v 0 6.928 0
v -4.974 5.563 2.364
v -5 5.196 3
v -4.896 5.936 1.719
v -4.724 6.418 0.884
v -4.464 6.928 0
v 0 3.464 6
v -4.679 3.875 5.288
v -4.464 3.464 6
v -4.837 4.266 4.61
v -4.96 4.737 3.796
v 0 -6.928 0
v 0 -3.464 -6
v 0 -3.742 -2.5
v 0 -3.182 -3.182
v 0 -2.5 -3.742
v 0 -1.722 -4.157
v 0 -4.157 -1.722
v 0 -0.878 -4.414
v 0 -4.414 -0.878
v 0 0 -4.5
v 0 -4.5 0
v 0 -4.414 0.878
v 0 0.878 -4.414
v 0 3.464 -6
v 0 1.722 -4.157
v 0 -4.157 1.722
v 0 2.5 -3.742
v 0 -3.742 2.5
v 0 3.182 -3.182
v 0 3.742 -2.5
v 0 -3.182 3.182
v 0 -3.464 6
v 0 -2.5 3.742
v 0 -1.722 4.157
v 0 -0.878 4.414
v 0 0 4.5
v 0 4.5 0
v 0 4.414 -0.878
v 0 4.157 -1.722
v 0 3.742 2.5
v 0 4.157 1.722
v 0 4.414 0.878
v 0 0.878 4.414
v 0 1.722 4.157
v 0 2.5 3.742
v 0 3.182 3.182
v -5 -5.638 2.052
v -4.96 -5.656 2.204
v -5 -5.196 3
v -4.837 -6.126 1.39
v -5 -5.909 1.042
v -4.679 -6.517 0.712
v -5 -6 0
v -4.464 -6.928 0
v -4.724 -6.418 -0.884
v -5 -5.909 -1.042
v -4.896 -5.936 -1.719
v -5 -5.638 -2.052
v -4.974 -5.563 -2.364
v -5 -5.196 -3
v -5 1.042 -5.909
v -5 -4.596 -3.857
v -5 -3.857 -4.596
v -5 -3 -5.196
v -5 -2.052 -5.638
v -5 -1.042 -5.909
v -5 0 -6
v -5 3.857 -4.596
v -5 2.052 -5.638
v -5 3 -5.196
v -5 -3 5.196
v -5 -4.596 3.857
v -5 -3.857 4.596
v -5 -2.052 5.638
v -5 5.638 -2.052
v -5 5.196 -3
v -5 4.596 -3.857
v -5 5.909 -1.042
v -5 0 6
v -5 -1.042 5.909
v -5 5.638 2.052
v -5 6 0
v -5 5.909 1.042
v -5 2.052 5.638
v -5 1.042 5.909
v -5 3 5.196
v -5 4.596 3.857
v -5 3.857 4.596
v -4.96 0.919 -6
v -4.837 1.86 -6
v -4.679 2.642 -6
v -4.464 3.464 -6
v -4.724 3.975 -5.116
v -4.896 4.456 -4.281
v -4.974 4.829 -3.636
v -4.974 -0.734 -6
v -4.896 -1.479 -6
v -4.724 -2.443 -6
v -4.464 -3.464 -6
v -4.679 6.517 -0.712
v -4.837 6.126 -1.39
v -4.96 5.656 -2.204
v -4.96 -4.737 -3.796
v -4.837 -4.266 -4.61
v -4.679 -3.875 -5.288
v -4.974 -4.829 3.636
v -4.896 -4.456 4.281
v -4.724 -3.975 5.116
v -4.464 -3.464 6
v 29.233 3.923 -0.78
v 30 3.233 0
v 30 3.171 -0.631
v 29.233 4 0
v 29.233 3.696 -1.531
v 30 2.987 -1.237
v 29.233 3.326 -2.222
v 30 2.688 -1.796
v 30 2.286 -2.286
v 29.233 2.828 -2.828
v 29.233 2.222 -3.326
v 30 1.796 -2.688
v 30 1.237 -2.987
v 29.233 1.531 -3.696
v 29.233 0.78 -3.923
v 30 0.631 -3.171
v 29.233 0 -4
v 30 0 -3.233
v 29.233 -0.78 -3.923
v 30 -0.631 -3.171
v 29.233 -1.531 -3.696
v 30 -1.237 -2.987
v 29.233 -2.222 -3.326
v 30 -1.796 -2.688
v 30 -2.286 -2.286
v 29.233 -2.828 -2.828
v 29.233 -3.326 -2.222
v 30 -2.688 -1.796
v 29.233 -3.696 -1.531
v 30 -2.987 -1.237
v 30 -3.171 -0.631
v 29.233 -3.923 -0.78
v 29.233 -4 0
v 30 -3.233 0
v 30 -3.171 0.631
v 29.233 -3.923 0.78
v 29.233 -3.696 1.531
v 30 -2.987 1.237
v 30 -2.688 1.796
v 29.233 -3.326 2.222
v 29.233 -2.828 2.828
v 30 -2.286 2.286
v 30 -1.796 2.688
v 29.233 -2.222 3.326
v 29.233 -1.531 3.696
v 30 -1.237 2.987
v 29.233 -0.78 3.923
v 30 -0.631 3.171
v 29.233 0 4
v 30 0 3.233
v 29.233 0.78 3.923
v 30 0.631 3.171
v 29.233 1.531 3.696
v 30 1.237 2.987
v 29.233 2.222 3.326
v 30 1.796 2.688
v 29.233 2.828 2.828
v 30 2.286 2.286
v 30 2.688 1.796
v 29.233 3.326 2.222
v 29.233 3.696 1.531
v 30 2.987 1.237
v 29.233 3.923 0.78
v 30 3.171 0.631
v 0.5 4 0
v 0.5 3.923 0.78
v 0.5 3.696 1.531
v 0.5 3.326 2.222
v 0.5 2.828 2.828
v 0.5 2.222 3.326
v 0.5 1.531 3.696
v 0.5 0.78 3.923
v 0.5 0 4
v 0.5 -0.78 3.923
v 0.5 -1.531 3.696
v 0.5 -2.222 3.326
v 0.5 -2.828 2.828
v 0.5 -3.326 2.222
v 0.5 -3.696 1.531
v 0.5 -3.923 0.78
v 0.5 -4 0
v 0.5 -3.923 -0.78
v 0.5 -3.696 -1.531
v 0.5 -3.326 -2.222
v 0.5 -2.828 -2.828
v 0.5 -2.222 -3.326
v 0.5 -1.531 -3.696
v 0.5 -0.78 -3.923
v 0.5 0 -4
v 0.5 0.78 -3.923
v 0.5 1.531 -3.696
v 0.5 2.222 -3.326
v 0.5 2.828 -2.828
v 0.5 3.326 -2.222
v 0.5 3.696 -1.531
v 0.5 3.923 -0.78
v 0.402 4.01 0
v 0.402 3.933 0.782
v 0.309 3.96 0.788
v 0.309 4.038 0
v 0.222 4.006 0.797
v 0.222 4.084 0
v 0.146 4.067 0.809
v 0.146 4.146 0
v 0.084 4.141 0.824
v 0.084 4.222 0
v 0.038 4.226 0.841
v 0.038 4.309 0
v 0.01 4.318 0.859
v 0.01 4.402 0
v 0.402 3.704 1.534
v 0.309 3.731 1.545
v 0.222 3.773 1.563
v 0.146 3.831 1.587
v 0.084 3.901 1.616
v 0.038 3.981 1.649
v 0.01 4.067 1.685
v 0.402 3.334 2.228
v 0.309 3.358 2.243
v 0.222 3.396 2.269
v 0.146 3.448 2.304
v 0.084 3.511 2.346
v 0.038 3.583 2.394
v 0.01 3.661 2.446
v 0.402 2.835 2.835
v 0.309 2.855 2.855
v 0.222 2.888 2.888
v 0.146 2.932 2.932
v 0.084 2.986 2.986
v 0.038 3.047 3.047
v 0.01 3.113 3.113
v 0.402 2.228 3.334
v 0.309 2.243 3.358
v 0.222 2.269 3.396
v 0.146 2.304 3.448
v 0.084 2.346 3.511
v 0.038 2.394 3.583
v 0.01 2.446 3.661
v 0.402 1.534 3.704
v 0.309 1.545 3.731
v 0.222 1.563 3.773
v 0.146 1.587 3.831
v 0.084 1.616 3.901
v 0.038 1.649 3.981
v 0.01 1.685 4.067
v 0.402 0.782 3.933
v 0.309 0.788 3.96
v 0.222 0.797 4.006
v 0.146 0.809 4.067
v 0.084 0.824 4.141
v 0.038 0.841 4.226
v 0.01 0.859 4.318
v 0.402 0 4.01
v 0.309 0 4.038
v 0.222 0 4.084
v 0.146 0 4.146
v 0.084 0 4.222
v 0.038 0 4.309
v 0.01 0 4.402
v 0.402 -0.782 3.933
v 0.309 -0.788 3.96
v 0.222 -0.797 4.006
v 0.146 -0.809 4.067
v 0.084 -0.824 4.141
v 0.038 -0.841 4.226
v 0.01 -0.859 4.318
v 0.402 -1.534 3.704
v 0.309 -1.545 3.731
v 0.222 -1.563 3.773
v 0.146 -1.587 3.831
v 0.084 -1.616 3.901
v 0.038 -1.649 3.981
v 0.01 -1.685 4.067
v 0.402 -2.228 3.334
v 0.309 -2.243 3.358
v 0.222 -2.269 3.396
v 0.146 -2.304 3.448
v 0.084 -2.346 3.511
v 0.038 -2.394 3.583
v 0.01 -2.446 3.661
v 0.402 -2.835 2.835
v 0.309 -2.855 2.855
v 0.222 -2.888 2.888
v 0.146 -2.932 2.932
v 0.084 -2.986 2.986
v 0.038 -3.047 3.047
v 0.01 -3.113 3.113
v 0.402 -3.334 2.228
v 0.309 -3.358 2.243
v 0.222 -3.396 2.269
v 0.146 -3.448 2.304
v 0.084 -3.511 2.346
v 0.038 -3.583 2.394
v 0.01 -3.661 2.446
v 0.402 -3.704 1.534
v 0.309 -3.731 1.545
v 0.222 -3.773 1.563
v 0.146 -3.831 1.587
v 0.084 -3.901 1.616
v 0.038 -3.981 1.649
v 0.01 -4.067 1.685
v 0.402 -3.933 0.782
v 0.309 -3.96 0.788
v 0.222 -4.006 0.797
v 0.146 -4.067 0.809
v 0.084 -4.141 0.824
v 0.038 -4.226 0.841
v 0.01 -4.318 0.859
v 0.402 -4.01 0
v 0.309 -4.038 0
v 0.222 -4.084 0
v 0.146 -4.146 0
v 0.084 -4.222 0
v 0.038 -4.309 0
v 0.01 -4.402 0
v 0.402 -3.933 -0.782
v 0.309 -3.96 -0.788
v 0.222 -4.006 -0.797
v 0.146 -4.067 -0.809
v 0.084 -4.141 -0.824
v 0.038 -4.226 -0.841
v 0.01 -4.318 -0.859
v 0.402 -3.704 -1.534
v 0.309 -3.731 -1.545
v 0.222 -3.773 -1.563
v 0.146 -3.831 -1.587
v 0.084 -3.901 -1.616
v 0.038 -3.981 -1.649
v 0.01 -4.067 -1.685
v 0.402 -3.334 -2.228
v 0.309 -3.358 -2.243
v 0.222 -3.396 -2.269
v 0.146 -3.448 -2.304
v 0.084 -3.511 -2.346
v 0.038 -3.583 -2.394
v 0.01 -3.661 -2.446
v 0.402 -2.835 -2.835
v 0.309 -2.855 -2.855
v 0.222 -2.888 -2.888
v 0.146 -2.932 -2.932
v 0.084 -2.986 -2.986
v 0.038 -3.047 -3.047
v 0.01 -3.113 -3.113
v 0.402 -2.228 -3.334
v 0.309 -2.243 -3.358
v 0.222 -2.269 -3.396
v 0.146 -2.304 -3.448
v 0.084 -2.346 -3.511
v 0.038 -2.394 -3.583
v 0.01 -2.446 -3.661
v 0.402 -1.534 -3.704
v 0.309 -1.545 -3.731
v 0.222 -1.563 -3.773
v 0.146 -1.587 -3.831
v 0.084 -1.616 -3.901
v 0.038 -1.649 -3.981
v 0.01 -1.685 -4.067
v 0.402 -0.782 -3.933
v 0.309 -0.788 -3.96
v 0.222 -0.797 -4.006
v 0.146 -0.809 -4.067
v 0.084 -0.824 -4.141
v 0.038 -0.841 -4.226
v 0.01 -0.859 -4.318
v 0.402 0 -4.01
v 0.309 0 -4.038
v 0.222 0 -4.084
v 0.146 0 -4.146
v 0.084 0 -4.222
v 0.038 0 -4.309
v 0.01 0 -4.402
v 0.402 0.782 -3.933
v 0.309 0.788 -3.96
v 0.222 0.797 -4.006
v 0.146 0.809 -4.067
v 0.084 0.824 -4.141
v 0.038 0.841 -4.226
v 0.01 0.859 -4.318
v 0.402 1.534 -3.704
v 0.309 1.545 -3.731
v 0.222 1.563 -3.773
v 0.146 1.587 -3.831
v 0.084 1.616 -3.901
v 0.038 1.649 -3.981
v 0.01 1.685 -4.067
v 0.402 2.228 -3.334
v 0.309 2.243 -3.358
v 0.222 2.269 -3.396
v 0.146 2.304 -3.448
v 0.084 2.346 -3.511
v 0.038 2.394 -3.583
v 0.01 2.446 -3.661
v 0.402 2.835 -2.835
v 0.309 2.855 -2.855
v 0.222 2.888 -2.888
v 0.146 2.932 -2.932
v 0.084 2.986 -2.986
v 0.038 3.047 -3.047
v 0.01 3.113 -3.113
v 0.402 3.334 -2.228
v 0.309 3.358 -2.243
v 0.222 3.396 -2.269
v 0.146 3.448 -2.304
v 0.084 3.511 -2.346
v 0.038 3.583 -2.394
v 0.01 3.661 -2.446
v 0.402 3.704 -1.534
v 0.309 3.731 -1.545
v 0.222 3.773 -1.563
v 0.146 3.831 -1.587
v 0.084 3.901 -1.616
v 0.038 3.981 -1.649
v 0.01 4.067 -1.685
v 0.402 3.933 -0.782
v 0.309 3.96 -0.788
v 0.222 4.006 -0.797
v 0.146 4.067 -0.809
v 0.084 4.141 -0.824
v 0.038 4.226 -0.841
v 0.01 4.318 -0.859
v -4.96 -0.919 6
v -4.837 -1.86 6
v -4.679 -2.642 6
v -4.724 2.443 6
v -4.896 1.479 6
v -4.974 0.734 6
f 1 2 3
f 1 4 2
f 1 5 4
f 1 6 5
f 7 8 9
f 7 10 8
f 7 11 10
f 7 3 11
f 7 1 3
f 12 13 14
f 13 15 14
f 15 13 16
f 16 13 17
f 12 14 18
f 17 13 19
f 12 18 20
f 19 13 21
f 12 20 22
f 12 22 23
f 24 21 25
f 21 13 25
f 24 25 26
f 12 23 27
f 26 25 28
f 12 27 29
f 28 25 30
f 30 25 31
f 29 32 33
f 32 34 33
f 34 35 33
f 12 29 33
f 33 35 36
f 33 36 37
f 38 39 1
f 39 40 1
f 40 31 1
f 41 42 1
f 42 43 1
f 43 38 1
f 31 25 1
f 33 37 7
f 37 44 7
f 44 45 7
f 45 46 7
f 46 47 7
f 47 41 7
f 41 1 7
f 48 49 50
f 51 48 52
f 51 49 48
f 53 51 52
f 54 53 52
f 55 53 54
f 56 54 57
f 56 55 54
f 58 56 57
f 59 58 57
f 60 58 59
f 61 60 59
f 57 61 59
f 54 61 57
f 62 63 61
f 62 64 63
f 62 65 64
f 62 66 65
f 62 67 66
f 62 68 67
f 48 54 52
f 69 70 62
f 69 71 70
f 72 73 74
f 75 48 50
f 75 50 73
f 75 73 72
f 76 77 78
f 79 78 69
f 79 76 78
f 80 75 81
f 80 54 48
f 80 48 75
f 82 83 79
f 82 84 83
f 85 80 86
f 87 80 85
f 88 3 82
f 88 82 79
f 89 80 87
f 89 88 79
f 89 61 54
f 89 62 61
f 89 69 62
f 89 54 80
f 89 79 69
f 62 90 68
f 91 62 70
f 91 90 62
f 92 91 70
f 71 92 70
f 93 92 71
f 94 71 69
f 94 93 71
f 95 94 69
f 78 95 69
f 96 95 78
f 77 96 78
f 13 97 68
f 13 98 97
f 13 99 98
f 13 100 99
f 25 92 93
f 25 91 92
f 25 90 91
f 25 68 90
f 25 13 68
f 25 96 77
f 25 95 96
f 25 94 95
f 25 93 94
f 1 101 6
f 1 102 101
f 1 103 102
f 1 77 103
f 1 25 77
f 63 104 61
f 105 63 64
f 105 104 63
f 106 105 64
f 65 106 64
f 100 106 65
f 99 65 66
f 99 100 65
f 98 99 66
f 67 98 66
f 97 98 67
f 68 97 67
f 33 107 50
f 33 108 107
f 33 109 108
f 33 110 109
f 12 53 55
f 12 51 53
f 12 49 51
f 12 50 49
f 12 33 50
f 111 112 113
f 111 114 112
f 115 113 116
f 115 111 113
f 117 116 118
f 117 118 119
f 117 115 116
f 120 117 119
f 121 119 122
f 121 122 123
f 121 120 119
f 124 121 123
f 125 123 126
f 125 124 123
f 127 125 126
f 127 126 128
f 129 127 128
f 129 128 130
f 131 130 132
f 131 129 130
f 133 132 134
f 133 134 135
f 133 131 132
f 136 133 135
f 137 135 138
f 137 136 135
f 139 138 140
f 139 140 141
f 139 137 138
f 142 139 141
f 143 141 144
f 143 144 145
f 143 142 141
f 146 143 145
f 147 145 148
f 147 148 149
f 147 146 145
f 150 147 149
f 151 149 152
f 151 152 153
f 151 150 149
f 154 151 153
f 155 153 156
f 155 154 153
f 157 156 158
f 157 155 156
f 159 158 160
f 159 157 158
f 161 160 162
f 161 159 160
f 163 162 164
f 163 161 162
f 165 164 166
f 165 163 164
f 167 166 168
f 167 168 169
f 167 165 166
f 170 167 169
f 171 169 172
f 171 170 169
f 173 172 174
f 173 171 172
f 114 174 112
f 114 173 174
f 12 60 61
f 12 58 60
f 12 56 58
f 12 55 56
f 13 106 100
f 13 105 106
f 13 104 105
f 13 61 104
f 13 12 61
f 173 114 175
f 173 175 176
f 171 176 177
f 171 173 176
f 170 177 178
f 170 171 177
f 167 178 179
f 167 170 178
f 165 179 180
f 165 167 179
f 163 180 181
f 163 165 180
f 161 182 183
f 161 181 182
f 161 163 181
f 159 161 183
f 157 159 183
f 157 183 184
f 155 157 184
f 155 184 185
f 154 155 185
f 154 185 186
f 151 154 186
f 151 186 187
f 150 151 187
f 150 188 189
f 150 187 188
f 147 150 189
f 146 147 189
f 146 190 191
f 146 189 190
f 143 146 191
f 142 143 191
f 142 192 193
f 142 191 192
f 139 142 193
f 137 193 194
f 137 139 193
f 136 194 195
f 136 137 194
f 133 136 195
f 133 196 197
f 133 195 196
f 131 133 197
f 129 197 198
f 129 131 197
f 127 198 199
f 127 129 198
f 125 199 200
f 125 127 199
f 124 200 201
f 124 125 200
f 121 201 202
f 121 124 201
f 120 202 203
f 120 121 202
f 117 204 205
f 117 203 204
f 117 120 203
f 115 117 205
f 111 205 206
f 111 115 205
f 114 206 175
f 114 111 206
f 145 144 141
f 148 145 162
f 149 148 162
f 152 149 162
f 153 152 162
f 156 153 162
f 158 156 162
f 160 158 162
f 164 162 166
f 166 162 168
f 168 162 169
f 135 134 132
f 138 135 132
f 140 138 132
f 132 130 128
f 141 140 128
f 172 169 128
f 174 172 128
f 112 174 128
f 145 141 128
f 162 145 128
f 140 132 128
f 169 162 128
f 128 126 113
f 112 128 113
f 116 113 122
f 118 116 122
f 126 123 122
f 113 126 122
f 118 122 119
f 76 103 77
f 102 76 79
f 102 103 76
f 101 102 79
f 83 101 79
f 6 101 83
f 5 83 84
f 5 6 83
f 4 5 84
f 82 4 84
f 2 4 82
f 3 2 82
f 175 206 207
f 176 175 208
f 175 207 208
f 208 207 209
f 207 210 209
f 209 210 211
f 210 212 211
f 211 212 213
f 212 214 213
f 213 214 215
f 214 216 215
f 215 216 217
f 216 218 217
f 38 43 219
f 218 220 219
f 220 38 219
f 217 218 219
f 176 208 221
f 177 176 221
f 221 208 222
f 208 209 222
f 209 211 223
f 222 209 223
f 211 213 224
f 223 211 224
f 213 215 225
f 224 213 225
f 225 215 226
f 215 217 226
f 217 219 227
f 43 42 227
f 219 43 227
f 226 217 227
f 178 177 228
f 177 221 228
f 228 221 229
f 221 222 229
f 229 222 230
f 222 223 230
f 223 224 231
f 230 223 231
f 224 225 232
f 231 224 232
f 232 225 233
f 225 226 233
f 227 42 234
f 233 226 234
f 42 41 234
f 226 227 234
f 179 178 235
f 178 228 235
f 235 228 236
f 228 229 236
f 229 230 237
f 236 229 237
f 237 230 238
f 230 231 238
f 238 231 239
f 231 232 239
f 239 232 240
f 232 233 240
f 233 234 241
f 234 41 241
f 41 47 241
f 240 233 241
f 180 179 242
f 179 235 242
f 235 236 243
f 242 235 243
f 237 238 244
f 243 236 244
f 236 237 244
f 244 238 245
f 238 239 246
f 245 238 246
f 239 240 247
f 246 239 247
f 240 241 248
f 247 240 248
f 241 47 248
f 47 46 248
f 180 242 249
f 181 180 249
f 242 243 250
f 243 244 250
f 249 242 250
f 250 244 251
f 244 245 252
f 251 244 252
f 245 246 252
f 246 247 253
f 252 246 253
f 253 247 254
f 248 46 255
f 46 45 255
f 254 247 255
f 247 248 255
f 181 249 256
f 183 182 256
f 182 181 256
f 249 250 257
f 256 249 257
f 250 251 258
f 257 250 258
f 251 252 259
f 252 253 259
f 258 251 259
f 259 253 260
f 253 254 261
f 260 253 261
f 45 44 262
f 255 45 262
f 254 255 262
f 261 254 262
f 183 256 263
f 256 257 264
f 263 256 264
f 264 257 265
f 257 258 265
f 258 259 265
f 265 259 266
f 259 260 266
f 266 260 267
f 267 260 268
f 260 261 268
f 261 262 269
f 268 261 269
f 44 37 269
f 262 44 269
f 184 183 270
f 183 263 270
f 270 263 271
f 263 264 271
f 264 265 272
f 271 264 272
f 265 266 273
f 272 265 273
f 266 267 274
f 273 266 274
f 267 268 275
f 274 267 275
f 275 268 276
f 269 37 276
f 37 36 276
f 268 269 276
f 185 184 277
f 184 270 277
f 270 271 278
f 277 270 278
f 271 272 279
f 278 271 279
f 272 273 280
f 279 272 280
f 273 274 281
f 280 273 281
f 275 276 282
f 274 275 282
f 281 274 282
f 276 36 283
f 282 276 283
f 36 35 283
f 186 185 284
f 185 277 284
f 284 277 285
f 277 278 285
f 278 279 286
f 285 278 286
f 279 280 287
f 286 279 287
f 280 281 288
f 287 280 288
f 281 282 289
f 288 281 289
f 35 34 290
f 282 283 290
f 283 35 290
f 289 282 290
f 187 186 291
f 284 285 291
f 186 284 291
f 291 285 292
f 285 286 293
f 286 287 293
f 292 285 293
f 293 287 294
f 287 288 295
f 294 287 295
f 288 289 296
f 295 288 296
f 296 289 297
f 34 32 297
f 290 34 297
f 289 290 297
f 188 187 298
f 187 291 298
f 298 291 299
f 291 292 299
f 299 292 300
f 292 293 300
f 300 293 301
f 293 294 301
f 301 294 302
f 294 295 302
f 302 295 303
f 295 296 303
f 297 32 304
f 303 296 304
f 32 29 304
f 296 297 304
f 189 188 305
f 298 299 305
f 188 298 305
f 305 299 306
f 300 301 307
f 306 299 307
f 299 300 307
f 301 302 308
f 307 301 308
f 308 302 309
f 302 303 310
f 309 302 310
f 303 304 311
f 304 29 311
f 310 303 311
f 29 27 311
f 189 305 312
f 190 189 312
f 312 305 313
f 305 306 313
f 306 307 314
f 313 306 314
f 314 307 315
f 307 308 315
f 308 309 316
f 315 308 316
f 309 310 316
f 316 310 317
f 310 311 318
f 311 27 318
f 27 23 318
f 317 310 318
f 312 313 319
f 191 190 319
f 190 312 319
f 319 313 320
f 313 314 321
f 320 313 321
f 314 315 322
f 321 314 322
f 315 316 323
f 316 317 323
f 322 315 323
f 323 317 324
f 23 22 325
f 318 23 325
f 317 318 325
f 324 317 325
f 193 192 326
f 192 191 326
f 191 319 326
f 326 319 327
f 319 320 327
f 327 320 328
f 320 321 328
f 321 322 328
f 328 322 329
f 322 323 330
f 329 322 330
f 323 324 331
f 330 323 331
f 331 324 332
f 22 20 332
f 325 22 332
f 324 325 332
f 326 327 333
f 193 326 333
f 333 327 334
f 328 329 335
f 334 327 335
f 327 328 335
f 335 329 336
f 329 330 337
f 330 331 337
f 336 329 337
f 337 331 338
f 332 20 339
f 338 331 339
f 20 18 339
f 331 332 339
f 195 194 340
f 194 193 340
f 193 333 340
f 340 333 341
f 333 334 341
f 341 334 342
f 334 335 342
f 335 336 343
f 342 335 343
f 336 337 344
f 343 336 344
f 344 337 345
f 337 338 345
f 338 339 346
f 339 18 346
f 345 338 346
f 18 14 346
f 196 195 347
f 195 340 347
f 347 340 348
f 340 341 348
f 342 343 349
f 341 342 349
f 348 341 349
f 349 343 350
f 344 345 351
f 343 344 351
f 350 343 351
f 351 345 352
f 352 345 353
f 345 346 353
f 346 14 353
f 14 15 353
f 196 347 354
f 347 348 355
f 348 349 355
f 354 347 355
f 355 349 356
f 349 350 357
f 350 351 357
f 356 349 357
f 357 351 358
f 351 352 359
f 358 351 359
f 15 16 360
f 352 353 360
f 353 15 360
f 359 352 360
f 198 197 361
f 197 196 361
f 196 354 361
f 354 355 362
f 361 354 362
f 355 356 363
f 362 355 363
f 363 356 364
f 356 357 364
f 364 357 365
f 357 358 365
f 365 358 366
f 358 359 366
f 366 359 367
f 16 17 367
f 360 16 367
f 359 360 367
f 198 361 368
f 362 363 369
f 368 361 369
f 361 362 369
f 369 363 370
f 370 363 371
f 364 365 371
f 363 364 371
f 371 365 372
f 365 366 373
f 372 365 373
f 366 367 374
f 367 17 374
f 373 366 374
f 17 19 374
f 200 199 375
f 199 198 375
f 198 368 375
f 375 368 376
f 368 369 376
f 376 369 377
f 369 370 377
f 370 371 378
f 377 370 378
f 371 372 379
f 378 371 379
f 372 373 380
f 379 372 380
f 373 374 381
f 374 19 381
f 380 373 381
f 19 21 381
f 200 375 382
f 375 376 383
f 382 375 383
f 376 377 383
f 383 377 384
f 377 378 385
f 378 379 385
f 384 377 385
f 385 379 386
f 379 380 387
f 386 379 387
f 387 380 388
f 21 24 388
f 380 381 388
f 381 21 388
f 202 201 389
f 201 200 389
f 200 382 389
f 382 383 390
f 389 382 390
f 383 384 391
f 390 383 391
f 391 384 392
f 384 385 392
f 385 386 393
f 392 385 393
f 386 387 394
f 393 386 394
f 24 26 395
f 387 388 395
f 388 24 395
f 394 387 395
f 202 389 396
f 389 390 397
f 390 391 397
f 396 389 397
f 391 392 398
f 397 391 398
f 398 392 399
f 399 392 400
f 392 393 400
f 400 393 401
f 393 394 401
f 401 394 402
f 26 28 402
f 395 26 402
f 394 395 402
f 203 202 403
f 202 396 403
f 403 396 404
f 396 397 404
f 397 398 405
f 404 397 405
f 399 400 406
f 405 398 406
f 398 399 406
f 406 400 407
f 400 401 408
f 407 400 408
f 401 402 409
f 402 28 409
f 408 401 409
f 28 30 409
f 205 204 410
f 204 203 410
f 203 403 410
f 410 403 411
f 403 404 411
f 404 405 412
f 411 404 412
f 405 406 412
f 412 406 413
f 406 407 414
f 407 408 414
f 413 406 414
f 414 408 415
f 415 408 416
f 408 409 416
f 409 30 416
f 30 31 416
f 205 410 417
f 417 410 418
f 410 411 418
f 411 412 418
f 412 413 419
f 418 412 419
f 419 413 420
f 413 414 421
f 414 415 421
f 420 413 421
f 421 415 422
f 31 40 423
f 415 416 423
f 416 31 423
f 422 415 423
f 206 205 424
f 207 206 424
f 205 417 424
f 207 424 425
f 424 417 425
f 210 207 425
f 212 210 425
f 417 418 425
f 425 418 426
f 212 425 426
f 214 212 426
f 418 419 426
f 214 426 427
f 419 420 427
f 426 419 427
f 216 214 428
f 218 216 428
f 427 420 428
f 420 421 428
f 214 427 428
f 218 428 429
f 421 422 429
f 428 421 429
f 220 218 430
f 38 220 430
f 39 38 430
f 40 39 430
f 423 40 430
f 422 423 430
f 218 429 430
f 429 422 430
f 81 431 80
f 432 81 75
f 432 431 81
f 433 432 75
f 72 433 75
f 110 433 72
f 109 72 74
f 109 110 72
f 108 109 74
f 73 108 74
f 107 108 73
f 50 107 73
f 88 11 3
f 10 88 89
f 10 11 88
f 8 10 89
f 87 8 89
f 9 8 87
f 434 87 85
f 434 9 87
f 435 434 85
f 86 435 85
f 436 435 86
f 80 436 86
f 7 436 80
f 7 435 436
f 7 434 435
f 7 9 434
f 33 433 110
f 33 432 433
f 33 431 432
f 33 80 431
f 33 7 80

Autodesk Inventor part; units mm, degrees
ref_plane "YZ Plane" through (0, 0, 0) normal (1, 0, 0) x (0, 1, 0)
ref_plane "XZ Plane" through (0, 0, 0) normal (0, 1, 0) x (-1, 0, 0)
sketch "Náčrt1" plane through (0, 0, 0) normal (0, 0, 1) x (1, 0, 0)
  line L0 (0, 4) -> (30, 4)
  line L1 (30, 4) -> (30, 0)
  line L2 (30, 0) -> (0, 0)
  line L3 (-6, 0) -> (36, 0) projected
  line L4 (0, -0.8) -> (0, 4.8) projected
  line L5 (0, 4) -> (0, 0)
  dimension "d2" = 8
  dimension "d59" = 30
revolve "Těleso" add sketch "Náčrt1" angle 360 about axis through (30, 0, 0) along (-1, 0, 0)
sketch "Náčrt2" plane through (0, 0, 0) normal (-1, 0, 0) x (0, 0, 1)
  line L0 (0, 6.9282) -> (6, 3.4641)
  line L1 (6, 3.4641) -> (6, -3.4641)
  line L2 (6, -3.4641) -> (0, -6.9282)
  line L3 (0, -6.9282) -> (-6, -3.4641)
  line L4 (-6, -3.4641) -> (-6, 3.4641)
  line L5 (-6, 3.4641) -> (0, 6.9282)
  line L6 (-8.4, 0) -> (8.4, 0) projected
  line L7 (0, 9.6995) -> (0, -9.6995) projected
  point P0 (0, 0)
  point P1 (0, 0)
  dimension "d11" = 12
extrude "Hlava" add sketch "Náčrt2" along normal blind 5
sketch "Náčrt4" plane through (0, 0, 0) normal (0, 0, 1) x (1, 0, 0)
  line L0 (-4.3072, 7.2) -> (-5, 6)
  line L1 (-1.1, 0) -> (-0.234, 0)
  line L2 (-5.9532, 0) -> (0.7192, 0) projected
  line L3 (-5, 7.2) -> (-4.3072, 7.2)
  line L4 (-5, 6) -> (-5, 7.2)
  line L5 (0, 8.64) -> (0, -1.44) projected
  dimension "d65" = 12
  dimension "d67" = 30
  dimension "d68" = 14.4
  dimension "d69" = 5
revolve "Zkosení1" cut sketch "Náčrt4" angle 360 about axis through (-1.1, 0, 0) along (1, 0, 0)
thread "Závit" size "M8x1.25" class "6g" standard "ISO Metric profile" length 14
chamfer "Zkosení2" distance 0.7668 distance2 0.7669 1 edges at (30, -4, 0) measured on face at (30, -0.998, 0.8842)
fillet "Fillet2" radius 0.5 1 edges at (0, -4, 0)
ref_plane "Work Plane1" through (1.525, 0, 0) normal (0, 0, 1) x (1, 0, 0)
equation "\"d2\" = GD"
equation "\"d59\" = NLG"
equation "\"d11\" = SW"
equation "\"d3\" = KOH"
equation "\"d71\" = RR"
equation "\"d15\" = GEL"
equation "\"d6\" = -0.5 * SPD + 0.5 * GD"
equation "\"d65\" = SW"
equation "\"d67\" = ANG1"
equation "\"d68\" = 1.2 * SW"
equation "\"d69\" = KOH"
equation "\"NLG\" = 30"
equation "\"GD\" = NND"
equation "\"BDM\" = NND"
equation "\"KOH\" = 5"
equation "\"GEL\" = 14"
equation "\"SW\" = 12"
equation "\"SW0\" = 12"
equation "\"SPD\" = NND - 1.2269 * PTC"
equation "\"SD2\" = NND"
equation "\"SD\" = 0"
equation "\"ANG1\" = 30deg"
equation "\"GAL\" = 0.61345 * PTC"
equation "\"GUL\" = 0.61345 * PTC"
equation "\"RR\" = 0.5"
equation "\"RR1\" = 0.1"
equation "\"GD1\" = THREADDIA - 1.2269 * PTC"
equation "\"THREADDIA\" = 8"
equation "\"TOA\" = 30deg"
equation "\"FAWI\" = 60deg"
equation "\"PTC\" = 1.25"
equation "\"NND\" = 8"
equation "\"E0\" = 1.155 * SW"
properties part number "CSN 02 1201 - M8 x 30" material "Nerezová ocel"
